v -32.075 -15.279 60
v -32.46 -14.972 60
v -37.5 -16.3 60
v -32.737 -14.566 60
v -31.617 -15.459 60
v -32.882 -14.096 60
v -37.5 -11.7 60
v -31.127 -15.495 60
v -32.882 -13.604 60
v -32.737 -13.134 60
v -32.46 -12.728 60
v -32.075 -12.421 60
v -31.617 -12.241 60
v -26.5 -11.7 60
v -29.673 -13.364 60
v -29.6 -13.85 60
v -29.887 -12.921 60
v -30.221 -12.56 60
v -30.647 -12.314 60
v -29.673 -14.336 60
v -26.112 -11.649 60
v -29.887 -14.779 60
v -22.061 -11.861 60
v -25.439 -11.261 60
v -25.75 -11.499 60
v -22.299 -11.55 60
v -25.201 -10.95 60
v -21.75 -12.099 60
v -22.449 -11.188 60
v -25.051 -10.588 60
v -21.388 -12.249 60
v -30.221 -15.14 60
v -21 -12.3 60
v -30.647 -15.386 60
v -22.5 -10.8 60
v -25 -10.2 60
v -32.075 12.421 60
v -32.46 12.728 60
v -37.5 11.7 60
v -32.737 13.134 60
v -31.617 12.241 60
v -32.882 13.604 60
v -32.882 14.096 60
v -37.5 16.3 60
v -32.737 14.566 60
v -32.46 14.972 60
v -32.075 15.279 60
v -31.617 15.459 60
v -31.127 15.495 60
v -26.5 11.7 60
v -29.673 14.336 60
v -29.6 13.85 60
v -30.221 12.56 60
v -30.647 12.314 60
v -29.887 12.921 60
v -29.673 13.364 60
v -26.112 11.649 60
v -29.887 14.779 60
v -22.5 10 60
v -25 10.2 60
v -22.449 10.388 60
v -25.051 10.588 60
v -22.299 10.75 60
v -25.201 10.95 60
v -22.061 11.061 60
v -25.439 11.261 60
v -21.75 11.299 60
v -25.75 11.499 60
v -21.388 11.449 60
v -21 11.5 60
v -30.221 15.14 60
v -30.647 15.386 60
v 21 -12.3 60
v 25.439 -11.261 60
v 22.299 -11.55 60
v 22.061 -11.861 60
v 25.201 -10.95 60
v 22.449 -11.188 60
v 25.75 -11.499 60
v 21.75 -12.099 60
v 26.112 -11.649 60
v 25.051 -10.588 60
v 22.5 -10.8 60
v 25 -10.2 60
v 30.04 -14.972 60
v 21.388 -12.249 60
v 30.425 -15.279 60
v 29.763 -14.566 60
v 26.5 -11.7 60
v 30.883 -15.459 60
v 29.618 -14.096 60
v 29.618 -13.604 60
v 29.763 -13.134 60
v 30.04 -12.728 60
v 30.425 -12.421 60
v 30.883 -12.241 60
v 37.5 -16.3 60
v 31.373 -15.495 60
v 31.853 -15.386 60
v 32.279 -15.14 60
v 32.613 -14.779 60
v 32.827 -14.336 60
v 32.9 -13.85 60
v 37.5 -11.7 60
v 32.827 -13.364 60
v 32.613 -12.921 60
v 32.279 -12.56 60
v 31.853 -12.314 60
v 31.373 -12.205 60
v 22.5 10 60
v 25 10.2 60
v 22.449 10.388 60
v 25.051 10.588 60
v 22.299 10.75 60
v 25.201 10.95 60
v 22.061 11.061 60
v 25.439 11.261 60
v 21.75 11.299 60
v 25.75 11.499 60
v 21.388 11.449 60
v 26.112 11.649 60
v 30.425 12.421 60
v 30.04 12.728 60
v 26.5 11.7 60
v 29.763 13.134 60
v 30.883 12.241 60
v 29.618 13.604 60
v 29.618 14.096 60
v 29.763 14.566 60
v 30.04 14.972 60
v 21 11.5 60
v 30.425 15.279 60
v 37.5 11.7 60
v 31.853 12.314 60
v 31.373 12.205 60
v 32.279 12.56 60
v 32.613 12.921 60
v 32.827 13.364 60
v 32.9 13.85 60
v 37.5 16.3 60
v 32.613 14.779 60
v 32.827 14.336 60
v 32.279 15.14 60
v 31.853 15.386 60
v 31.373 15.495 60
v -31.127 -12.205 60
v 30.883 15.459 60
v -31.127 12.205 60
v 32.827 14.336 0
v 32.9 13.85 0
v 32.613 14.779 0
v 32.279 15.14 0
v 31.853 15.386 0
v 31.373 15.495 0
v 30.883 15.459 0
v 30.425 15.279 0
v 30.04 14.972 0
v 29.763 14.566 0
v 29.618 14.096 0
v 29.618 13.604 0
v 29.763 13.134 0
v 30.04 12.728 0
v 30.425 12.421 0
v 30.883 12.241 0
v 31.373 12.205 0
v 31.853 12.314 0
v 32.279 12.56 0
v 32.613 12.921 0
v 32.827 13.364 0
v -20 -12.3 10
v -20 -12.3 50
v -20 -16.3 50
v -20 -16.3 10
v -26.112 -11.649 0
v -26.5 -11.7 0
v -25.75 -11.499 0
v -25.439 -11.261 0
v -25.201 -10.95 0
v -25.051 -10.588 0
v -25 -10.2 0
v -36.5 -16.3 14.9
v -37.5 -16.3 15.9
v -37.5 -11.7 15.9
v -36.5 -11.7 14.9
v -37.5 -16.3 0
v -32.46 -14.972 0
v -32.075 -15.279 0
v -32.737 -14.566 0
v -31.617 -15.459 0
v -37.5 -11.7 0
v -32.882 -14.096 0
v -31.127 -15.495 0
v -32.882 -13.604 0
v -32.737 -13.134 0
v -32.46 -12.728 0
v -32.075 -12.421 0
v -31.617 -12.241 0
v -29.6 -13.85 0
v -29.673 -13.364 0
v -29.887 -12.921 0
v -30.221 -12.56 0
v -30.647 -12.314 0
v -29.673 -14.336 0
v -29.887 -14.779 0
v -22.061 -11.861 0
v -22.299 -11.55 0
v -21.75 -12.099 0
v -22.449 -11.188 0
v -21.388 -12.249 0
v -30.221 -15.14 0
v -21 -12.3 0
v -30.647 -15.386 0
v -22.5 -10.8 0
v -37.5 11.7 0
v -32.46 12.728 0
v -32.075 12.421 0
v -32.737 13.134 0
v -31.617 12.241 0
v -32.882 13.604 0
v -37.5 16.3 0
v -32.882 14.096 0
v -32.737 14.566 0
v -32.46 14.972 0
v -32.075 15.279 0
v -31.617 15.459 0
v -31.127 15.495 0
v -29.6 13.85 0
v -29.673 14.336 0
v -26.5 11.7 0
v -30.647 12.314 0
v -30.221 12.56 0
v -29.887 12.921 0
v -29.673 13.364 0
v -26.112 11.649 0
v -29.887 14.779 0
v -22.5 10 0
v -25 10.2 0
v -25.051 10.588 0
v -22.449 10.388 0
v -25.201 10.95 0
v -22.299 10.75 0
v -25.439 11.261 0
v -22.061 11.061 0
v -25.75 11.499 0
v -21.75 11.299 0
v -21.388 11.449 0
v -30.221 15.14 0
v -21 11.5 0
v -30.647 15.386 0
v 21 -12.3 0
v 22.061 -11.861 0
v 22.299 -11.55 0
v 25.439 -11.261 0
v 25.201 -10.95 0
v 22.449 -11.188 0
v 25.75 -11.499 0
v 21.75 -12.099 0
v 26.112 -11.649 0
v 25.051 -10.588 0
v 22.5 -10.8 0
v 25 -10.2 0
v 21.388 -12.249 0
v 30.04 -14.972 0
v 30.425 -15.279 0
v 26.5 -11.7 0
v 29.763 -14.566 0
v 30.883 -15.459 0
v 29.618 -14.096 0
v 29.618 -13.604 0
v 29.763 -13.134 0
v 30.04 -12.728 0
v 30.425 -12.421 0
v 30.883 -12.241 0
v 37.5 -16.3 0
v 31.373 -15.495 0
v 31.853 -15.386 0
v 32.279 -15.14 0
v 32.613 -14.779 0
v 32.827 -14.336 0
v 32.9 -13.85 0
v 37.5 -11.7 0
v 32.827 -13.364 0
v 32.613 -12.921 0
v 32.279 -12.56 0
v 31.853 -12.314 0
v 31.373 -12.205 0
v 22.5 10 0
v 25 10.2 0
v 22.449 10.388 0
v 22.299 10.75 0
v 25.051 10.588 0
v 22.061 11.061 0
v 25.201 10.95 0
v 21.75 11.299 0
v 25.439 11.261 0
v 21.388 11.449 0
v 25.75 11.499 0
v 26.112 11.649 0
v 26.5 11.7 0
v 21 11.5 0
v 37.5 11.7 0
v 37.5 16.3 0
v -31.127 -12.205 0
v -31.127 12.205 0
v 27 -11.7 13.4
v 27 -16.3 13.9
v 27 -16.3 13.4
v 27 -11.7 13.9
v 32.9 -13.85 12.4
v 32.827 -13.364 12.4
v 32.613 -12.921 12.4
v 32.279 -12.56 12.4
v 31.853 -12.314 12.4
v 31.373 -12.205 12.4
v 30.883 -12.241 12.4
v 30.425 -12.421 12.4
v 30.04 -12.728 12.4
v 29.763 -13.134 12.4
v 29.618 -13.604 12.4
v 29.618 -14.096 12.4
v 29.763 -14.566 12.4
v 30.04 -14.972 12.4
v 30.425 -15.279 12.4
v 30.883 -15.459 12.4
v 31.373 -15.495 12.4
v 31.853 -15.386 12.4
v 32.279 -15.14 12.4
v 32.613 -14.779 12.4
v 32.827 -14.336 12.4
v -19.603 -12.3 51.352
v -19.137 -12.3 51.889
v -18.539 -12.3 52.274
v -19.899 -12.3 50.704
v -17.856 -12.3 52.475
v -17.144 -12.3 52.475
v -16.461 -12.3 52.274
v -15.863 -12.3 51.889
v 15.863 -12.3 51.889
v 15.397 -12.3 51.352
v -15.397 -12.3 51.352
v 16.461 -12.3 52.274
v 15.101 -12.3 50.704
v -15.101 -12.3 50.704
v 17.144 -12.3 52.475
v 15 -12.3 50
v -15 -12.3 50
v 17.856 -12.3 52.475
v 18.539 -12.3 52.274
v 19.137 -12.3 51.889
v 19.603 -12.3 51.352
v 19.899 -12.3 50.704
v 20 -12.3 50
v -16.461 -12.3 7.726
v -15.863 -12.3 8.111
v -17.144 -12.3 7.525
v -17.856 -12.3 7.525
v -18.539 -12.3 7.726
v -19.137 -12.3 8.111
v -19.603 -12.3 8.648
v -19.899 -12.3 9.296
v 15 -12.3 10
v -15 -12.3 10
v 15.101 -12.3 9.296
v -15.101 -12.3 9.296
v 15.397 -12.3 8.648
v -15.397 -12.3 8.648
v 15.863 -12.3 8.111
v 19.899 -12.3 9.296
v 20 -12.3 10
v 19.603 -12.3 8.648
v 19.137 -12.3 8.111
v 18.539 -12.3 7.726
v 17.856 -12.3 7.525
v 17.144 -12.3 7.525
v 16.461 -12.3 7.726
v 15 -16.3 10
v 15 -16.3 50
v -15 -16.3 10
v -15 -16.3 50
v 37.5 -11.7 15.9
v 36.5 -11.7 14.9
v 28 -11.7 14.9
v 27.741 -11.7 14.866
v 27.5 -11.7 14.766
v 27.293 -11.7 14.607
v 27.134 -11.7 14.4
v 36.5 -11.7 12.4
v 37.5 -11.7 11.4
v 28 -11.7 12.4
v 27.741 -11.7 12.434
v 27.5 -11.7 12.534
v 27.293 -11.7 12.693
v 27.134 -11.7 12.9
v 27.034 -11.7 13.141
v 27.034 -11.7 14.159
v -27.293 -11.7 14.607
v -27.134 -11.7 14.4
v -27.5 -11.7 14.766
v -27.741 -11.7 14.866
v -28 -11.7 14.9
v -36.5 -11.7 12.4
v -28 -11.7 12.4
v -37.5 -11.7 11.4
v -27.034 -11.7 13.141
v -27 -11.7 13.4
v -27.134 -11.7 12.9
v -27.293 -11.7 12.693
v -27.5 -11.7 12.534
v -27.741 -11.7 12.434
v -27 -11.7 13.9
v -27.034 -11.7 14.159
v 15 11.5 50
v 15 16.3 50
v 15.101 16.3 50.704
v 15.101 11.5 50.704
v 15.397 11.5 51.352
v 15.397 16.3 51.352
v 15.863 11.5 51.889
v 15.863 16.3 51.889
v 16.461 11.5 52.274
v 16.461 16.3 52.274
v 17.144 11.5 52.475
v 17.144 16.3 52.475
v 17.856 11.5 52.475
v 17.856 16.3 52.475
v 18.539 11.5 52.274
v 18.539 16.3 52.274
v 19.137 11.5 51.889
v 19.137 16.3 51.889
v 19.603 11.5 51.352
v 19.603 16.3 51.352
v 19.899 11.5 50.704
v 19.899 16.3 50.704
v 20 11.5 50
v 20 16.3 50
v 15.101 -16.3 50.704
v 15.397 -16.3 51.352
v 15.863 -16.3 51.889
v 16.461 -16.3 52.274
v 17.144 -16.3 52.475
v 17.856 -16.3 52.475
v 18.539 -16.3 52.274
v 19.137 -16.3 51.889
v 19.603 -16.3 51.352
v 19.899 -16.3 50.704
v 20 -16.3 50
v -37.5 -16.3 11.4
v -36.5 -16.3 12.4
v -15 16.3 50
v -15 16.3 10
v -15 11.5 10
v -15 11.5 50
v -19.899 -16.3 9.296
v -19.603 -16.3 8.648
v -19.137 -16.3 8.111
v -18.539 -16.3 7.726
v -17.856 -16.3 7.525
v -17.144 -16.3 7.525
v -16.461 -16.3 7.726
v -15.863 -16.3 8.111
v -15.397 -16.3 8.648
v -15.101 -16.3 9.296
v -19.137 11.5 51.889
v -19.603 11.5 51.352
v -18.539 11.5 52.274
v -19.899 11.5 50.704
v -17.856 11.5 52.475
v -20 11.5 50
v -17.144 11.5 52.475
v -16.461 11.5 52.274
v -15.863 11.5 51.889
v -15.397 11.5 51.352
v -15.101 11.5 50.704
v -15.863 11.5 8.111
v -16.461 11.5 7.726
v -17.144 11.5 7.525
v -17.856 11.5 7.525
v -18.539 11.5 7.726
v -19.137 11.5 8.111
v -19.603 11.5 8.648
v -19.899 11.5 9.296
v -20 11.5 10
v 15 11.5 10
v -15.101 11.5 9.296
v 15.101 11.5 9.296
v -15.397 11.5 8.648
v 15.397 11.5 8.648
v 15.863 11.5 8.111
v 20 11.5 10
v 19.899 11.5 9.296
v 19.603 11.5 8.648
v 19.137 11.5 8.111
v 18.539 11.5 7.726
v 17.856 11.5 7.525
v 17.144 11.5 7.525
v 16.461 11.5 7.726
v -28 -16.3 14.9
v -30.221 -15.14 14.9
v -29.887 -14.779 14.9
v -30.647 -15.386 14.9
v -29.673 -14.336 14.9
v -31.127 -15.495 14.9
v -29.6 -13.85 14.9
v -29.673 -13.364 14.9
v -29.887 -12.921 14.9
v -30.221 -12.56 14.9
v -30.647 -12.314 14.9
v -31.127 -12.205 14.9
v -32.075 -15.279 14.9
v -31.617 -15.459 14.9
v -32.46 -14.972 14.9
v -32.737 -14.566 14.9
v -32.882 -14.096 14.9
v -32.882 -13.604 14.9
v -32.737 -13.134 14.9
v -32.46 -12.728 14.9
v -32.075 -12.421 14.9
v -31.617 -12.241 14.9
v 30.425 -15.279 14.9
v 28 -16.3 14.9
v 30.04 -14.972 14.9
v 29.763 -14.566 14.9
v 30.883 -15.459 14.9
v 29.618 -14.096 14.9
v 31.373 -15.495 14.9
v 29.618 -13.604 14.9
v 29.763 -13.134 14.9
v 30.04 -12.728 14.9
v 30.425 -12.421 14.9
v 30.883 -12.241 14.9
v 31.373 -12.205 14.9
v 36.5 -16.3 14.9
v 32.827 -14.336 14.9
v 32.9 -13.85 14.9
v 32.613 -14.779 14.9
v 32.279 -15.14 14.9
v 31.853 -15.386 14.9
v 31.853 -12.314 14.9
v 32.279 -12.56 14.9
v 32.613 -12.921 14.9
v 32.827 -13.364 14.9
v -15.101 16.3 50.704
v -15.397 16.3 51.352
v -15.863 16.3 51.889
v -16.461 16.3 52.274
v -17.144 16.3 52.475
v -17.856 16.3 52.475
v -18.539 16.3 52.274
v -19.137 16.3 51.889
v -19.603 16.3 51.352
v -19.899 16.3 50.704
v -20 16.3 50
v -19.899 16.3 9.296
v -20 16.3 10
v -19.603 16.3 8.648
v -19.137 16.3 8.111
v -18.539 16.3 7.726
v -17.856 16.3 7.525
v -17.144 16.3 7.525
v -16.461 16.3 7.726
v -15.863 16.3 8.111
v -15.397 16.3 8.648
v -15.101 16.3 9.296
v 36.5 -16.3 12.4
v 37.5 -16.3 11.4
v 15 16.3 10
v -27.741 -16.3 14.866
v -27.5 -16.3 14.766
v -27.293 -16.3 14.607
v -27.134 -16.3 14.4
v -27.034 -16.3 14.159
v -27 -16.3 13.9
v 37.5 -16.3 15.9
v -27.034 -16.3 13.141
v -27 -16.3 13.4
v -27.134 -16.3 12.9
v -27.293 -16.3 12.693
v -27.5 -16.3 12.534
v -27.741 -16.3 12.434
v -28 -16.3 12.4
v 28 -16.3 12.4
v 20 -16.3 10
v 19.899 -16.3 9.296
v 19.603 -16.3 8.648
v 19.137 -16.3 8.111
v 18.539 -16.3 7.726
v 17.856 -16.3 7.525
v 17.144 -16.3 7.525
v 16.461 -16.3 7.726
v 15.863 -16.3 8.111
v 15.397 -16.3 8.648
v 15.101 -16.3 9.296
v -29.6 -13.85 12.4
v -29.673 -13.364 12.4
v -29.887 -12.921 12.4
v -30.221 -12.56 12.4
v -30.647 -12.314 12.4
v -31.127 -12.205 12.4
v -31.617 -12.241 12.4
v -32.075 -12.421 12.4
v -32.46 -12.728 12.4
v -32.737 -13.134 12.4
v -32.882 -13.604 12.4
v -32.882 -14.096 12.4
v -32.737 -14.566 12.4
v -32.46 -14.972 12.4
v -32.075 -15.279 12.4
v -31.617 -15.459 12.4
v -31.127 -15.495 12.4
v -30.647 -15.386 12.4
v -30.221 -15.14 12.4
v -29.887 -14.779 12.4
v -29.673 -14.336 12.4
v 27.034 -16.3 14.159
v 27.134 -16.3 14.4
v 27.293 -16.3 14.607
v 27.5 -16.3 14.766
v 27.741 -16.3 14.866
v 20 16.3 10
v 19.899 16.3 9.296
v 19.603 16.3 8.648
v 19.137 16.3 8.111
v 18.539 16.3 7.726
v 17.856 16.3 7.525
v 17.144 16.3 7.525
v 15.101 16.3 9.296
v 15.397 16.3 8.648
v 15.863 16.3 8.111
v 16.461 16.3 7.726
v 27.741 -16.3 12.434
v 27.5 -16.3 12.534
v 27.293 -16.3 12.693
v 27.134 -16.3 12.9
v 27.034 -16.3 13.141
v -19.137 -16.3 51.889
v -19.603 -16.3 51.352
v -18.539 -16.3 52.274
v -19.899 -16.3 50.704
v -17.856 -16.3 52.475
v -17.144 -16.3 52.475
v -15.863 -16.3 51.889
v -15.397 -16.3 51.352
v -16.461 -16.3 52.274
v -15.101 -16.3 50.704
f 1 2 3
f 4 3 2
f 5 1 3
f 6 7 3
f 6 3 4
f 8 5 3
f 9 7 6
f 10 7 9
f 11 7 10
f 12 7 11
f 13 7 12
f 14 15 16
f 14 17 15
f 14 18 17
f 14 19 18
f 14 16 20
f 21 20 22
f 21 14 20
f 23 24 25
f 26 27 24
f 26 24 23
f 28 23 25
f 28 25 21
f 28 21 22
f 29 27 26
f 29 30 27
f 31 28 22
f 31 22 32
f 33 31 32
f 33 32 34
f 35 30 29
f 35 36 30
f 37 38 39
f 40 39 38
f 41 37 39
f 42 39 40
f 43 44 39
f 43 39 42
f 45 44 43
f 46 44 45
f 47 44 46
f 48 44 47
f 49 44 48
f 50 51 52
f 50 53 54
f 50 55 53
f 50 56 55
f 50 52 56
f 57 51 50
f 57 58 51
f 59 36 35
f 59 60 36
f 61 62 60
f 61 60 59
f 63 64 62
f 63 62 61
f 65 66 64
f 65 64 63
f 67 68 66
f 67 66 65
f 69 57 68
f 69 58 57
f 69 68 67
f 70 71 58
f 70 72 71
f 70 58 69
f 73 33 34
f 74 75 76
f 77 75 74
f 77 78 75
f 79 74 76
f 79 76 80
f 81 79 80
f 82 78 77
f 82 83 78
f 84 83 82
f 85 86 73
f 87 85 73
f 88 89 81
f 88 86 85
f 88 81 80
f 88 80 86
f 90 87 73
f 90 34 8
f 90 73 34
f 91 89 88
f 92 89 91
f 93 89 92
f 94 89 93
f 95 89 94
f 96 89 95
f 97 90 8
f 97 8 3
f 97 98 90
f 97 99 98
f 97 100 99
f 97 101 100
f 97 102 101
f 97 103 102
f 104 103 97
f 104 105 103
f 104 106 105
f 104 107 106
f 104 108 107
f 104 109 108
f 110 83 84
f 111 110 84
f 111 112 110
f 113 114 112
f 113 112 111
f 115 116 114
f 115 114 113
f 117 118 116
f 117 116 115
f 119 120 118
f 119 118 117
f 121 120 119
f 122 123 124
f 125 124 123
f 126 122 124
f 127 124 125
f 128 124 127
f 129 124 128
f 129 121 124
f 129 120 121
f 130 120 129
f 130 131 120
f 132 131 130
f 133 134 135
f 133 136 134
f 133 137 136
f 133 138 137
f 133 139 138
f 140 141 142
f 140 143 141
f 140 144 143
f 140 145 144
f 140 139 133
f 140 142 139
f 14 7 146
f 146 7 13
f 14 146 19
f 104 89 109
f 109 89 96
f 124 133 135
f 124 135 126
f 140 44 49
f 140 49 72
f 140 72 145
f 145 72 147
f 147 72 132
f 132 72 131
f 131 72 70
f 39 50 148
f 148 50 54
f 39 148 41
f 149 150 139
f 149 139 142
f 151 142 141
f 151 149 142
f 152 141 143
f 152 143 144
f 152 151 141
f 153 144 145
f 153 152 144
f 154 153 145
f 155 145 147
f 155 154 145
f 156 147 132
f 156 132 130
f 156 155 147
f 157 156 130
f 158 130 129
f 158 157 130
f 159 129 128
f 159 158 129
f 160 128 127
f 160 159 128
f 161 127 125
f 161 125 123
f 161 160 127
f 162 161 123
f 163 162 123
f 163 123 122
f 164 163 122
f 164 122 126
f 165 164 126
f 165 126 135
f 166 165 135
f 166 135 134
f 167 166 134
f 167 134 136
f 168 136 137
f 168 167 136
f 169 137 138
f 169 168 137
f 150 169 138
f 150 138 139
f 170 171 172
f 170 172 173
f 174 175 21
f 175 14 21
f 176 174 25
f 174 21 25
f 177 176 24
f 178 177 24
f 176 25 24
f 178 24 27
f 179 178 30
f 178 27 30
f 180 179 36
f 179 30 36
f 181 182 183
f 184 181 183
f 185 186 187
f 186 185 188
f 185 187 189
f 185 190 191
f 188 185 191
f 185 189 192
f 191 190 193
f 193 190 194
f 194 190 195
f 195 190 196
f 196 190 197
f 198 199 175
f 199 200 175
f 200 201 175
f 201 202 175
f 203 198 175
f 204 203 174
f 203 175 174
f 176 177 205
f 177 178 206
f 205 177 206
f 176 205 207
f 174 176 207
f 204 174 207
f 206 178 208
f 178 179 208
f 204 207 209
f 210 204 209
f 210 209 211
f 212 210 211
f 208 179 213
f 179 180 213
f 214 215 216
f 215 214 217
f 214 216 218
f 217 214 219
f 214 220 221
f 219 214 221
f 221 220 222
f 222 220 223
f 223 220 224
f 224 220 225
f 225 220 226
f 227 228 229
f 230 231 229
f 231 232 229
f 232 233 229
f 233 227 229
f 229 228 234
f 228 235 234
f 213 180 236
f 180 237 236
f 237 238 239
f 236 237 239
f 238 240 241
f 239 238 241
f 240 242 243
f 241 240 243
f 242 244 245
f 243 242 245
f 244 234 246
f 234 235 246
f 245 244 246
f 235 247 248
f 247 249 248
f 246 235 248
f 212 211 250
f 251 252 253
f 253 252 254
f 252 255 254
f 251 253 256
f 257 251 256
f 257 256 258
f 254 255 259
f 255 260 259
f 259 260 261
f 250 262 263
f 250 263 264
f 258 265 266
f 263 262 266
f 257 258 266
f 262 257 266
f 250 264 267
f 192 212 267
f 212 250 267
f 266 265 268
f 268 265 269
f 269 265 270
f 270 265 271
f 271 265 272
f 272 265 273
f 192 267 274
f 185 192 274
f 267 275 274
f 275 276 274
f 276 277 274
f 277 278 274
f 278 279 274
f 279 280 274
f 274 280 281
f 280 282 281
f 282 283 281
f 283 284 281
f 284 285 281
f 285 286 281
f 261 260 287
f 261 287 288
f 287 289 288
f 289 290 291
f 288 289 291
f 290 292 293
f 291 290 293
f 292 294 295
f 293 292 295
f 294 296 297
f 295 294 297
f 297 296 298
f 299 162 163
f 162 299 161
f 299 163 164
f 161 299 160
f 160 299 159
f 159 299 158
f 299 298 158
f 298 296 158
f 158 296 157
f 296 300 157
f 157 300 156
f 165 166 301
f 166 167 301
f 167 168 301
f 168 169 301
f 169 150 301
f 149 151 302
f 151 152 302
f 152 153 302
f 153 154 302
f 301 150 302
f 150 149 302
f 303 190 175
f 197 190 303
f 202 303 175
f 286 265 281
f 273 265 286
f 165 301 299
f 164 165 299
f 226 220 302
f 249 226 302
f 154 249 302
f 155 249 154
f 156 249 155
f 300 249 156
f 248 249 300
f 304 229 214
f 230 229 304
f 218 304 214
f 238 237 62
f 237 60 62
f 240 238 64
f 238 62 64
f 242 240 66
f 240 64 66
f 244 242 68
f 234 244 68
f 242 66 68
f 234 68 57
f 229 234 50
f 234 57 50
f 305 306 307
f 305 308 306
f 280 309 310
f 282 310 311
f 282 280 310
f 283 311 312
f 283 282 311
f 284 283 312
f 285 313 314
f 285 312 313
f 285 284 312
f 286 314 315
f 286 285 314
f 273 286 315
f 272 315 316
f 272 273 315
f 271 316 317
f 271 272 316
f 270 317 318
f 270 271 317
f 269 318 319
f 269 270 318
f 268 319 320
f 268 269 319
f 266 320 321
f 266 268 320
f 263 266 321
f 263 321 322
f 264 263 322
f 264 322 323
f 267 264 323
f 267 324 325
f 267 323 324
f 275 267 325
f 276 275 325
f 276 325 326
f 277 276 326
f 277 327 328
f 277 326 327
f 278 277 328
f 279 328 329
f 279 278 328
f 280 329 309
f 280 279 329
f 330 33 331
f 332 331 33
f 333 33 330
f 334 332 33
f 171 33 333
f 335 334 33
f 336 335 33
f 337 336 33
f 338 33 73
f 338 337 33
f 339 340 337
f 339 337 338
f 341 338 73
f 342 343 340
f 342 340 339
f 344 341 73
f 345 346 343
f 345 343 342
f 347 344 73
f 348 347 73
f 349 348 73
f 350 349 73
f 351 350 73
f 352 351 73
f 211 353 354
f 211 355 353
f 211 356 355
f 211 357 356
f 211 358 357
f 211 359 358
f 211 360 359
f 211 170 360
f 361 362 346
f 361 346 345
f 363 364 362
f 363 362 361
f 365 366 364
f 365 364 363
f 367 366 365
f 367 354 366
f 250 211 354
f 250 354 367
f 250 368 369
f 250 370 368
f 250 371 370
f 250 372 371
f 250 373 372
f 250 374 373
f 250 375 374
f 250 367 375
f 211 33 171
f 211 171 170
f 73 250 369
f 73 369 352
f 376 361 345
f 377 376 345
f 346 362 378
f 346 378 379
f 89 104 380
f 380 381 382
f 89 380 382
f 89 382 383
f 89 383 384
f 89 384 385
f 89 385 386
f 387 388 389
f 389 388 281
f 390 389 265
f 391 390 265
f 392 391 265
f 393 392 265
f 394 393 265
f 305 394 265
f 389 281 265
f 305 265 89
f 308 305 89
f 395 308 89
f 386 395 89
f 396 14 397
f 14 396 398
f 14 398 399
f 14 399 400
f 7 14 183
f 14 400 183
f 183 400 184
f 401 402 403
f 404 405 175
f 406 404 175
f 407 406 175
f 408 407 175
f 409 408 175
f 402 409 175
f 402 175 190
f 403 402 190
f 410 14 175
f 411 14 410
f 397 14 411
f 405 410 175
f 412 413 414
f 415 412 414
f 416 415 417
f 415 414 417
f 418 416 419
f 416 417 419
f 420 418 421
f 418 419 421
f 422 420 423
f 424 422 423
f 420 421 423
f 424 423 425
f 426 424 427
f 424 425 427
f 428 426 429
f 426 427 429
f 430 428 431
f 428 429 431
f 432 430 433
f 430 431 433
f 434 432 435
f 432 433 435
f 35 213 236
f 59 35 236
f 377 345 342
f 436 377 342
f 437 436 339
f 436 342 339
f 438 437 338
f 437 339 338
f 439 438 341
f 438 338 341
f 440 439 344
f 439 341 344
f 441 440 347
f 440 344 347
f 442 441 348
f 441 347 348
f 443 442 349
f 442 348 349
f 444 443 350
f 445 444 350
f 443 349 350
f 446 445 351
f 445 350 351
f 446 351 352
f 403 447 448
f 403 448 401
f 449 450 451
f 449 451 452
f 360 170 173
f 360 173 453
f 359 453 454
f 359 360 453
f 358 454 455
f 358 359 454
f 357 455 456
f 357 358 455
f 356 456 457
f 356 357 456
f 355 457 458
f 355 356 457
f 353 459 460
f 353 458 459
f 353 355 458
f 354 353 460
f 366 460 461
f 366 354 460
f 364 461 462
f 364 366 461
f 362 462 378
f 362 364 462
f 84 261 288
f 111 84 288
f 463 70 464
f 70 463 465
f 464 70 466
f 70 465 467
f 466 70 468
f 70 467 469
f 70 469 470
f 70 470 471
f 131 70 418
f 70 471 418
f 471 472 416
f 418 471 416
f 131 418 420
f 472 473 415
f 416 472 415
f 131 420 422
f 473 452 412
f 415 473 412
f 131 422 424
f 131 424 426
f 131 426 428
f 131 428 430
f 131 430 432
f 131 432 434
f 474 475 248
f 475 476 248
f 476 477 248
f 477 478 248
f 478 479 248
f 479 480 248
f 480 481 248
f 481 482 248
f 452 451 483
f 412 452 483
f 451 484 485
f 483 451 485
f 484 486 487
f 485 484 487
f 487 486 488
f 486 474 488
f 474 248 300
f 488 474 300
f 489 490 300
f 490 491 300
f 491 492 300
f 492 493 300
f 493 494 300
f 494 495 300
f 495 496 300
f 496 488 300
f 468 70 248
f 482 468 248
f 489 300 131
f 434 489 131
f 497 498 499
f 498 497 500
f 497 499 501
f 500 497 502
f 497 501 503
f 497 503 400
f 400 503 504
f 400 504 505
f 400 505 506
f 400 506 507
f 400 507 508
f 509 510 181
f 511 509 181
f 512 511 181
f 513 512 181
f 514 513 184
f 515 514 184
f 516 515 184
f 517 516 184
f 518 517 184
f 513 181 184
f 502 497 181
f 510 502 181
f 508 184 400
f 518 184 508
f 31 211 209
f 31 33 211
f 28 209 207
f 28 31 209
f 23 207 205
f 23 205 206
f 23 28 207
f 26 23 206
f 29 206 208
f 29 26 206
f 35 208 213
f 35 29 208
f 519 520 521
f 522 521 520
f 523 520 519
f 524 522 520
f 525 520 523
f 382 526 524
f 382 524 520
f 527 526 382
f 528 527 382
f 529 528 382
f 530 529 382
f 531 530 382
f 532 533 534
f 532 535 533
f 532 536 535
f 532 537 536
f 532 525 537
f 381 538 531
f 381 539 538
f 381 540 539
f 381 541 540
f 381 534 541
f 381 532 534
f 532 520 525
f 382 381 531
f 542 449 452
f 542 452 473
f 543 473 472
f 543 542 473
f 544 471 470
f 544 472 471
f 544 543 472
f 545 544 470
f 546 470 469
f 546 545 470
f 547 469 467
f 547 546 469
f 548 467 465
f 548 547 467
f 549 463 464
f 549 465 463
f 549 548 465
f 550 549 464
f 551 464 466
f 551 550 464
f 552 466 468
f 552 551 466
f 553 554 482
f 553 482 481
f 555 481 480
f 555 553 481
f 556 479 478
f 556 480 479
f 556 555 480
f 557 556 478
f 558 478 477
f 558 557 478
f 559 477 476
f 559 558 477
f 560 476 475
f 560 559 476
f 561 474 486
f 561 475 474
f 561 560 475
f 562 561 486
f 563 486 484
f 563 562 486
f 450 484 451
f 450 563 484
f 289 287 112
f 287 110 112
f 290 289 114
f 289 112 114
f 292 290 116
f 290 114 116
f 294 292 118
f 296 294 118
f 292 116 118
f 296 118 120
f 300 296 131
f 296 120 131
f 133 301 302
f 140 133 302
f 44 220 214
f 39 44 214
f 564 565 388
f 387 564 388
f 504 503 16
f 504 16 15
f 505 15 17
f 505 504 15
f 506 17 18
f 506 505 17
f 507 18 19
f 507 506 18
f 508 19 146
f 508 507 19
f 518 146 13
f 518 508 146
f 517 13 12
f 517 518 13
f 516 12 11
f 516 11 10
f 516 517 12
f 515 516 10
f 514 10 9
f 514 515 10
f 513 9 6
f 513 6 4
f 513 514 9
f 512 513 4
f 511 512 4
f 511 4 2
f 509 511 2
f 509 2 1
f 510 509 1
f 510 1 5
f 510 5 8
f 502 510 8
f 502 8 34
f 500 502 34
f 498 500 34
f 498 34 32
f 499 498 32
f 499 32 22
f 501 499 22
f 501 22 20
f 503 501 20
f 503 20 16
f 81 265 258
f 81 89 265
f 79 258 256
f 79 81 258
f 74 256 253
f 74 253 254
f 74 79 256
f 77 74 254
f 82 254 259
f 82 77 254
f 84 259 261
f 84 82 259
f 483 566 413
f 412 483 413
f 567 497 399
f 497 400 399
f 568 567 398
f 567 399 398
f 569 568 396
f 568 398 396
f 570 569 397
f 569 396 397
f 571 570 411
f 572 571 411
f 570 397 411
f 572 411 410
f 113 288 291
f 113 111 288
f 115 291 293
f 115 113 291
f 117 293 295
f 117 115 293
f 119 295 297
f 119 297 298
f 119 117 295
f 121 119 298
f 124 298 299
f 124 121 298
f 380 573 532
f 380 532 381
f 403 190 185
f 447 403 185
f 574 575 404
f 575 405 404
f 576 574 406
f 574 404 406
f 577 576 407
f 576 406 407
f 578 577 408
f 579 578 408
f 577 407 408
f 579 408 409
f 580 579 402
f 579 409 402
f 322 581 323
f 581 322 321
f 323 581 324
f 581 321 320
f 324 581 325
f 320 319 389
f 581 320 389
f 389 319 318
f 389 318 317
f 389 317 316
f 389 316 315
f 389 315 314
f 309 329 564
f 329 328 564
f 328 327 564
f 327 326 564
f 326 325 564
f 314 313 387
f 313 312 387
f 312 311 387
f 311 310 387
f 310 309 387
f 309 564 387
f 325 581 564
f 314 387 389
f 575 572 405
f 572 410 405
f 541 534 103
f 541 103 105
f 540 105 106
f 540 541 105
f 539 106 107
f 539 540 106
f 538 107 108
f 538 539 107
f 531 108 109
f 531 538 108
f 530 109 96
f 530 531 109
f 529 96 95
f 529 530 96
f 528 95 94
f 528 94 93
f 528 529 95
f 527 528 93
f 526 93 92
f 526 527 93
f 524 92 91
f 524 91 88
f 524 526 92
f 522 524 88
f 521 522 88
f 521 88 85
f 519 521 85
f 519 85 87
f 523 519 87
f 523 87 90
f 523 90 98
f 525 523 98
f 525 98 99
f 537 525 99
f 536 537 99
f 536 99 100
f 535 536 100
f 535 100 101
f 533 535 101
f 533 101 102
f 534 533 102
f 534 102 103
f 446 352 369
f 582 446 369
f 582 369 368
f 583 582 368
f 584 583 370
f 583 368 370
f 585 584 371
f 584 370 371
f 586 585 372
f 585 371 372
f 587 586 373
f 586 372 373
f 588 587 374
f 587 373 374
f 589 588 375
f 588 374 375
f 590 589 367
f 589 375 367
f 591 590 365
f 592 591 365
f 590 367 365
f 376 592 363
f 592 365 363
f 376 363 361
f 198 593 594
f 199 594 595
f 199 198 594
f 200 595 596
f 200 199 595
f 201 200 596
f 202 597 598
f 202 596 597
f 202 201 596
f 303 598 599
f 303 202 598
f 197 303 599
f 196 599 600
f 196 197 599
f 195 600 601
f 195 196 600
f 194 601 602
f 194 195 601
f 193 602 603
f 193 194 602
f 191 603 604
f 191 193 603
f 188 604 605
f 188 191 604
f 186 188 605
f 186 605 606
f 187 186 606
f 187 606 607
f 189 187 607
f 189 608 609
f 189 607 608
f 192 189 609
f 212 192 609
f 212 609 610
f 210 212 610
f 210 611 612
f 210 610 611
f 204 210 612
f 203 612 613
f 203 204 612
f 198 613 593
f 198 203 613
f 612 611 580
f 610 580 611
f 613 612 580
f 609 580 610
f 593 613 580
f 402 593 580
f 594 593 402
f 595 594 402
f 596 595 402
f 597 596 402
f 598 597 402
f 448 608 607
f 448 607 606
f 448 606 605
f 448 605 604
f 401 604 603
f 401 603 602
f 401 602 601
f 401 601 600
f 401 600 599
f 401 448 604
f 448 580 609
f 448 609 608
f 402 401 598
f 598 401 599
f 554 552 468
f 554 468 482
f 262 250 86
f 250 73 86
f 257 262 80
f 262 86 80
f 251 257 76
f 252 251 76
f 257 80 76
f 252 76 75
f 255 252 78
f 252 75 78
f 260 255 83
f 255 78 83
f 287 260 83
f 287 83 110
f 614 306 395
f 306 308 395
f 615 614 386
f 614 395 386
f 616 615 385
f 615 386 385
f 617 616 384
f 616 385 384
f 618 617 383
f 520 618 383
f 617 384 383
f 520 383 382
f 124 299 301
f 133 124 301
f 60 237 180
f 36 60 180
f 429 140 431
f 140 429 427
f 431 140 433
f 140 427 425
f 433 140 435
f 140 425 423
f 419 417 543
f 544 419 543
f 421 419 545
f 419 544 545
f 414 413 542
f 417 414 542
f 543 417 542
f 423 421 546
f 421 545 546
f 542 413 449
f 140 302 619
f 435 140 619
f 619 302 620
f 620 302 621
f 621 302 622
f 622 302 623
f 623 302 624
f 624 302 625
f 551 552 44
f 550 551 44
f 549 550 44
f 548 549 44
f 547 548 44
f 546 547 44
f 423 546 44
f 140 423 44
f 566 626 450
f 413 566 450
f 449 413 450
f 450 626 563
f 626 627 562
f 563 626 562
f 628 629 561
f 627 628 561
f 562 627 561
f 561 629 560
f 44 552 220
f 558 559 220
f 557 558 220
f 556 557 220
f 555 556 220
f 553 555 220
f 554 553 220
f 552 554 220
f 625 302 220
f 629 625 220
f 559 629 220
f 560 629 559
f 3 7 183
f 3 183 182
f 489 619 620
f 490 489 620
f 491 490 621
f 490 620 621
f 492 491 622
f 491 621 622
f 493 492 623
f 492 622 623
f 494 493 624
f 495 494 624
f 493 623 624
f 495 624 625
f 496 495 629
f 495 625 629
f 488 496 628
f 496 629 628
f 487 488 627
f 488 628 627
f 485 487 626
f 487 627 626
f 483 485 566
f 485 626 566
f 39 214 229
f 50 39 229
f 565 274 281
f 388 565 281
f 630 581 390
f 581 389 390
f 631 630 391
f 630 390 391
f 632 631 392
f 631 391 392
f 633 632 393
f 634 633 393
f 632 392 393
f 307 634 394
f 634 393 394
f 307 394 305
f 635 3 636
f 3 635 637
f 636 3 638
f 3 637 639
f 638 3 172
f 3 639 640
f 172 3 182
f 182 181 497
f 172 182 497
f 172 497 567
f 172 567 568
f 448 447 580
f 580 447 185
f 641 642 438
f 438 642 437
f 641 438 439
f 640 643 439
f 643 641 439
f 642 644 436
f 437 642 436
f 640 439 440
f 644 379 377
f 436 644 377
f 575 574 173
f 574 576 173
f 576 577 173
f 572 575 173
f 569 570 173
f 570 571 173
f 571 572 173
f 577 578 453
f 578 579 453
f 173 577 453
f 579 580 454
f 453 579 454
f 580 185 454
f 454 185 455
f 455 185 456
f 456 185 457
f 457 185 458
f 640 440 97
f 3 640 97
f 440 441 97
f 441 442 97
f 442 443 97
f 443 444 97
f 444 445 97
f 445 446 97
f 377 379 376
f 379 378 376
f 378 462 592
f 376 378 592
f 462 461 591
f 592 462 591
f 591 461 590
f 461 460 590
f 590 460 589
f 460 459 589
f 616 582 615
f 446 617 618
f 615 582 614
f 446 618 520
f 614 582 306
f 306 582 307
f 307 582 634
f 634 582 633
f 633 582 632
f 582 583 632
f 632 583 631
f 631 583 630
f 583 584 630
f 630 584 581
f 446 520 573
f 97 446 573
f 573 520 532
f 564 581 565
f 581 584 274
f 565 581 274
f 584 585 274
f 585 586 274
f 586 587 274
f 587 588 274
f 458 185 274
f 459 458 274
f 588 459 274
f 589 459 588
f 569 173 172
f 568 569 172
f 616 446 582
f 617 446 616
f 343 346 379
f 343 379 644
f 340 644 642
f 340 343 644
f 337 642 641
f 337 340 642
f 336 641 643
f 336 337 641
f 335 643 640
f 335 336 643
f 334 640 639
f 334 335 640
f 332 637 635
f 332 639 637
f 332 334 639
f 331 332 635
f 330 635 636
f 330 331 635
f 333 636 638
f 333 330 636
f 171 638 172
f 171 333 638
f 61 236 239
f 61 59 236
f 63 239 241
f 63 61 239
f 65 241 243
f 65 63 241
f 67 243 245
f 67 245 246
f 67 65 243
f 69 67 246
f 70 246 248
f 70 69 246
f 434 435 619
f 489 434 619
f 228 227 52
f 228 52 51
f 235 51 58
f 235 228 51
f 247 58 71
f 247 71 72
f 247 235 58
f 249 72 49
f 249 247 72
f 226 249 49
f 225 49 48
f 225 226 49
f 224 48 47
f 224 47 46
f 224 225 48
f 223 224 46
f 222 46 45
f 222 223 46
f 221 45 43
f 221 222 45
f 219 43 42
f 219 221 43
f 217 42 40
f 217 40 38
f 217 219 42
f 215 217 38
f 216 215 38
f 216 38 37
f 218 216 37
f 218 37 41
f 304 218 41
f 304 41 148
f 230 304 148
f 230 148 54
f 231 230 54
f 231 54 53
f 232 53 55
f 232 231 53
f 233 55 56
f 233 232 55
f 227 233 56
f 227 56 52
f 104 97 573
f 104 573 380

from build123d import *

# Parameters (mm, degrees)
SKETCH1_R               = 1.65
SKETCH1_W               = 45
SKETCH1_H               = 23.8
BOSS_EXTRUDE1_DEPTH     = 60
FILLET1_R               = 1.5
SKETCH2_W               = 2.5
SKETCH2_H               = 4.6
CUT_EXTRUDE1_DEPTH      = 10.5
FILLET2_R               = 1
CHAMFER1_SIZE           = 1
FILLET2_OF_MIRROR2_R    = 1
CHAMFER2_SIZE           = 1
CUT_EXTRUDE2_DEPTH      = 78.903850996
CUT_EXTRUDE2_DEPTH_BACK = 78.903850996


with BuildPart() as part:
    # Sketch1 → Boss-Extrude1 (new body)
    with BuildSketch(Plane.XY):
        Polygon((-25, -11.7), (-37.5, -11.7), (-37.5, -16.3), (37.5, -16.3), (37.5, -11.7), (25, -11.7), (25, 11.7), (37.5, 11.7), (37.5, 16.3), (-37.5, 16.3), (-37.5, 11.7), (-25, 11.7), align=None)
        with Locations((-31.25, -13.85)):
            Circle(SKETCH1_R, mode=Mode.SUBTRACT)
        with Locations((31.25, -13.85)):
            Circle(SKETCH1_R, mode=Mode.SUBTRACT)
        with Locations((0, -0.4)):
            Rectangle(SKETCH1_W, SKETCH1_H, mode=Mode.SUBTRACT)
        with Locations((-31.25, 13.85)):
            Circle(SKETCH1_R, mode=Mode.SUBTRACT)
        with Locations((31.25, 13.85)):
            Circle(SKETCH1_R, mode=Mode.SUBTRACT)
    extrude(amount=BOSS_EXTRUDE1_DEPTH)

    # Fillet1
    fillet1_edges = [part.edges().sort_by_distance(p)[0] for p in [
        (22.5, 11.5, 30),
        (-22.5, 11.5, 30),
        (-22.5, -12.3, 30),
        (22.5, -12.3, 30),
        (-25, -11.7, 30),
        (-25, 11.7, 30),
        (25, 11.7, 30),
        (25, -11.7, 30),
    ]]
    fillet(fillet1_edges, radius=FILLET1_R)

    # Sketch2 → Cut-Extrude1 (cut)
    with BuildSketch(Plane(origin=(37.5, 0, 0), x_dir=(0, 0, -1), z_dir=(1, 0, 0))):
        with Locations((-13.65, -14)):
            Rectangle(SKETCH2_W, SKETCH2_H)
    cut_extrude1 = extrude(amount=-CUT_EXTRUDE1_DEPTH, mode=Mode.SUBTRACT)

    # Fillet2
    fillet2_edges = [part.edges().sort_by_distance(p)[0] for p in [
        (27, -14, 14.9),
        (27, -14, 12.4),
    ]]
    fillet(fillet2_edges, radius=FILLET2_R)

    # Chamfer1
    chamfer1_edges = [part.edges().sort_by_distance(p)[0] for p in [
        (37.5, -14, 12.4),
        (37.5, -14, 14.9),
    ]]
    chamfer(chamfer1_edges, length=CHAMFER1_SIZE)

    # Mirror2: Cut-Extrude1 across plane
    add(cut_extrude1.mirror(Plane(origin=(0, 0, 0), x_dir=(0, 0, 1), z_dir=(1, 0, 0))), mode=Mode.SUBTRACT)

    # Fillet2 of Mirror2
    fillet2_of_mirror2_edges = [part.edges().sort_by_distance(p)[0] for p in [
        (-27, -14, 14.9),
        (-27, -14, 12.4),
    ]]
    fillet(fillet2_of_mirror2_edges, radius=FILLET2_OF_MIRROR2_R)

    # Chamfer2
    chamfer2_edges = [part.edges().sort_by_distance(p)[0] for p in [
        (-37.5, -14, 12.4),
        (-37.5, -14, 14.9),
    ]]
    chamfer(chamfer2_edges, length=CHAMFER2_SIZE)

    # Sketch3 → Cut-Extrude2 (cut, two sides: drawn at the far end of the back side and taken through both)
    with BuildSketch(Plane.XZ.offset(16.3).offset(-CUT_EXTRUDE2_DEPTH_BACK)):
        with BuildLine():
            Line((-20, 50), (-20, 10))
            ThreePointArc((-20, 10), (-17.5, 7.5), (-15, 10))
            Line((-15, 10), (-15, 50))
            ThreePointArc((-15, 50), (-17.5, 52.5), (-20, 50))
        make_face()
        with BuildLine():
            ThreePointArc((20, 10), (17.5, 7.5), (15, 10))
            Line((15, 10), (15, 50))
            ThreePointArc((15, 50), (17.5, 52.5), (20, 50))
            Line((20, 50), (20, 10))
        make_face()
    extrude(amount=CUT_EXTRUDE2_DEPTH + CUT_EXTRUDE2_DEPTH_BACK, mode=Mode.SUBTRACT)


solid = part.part
